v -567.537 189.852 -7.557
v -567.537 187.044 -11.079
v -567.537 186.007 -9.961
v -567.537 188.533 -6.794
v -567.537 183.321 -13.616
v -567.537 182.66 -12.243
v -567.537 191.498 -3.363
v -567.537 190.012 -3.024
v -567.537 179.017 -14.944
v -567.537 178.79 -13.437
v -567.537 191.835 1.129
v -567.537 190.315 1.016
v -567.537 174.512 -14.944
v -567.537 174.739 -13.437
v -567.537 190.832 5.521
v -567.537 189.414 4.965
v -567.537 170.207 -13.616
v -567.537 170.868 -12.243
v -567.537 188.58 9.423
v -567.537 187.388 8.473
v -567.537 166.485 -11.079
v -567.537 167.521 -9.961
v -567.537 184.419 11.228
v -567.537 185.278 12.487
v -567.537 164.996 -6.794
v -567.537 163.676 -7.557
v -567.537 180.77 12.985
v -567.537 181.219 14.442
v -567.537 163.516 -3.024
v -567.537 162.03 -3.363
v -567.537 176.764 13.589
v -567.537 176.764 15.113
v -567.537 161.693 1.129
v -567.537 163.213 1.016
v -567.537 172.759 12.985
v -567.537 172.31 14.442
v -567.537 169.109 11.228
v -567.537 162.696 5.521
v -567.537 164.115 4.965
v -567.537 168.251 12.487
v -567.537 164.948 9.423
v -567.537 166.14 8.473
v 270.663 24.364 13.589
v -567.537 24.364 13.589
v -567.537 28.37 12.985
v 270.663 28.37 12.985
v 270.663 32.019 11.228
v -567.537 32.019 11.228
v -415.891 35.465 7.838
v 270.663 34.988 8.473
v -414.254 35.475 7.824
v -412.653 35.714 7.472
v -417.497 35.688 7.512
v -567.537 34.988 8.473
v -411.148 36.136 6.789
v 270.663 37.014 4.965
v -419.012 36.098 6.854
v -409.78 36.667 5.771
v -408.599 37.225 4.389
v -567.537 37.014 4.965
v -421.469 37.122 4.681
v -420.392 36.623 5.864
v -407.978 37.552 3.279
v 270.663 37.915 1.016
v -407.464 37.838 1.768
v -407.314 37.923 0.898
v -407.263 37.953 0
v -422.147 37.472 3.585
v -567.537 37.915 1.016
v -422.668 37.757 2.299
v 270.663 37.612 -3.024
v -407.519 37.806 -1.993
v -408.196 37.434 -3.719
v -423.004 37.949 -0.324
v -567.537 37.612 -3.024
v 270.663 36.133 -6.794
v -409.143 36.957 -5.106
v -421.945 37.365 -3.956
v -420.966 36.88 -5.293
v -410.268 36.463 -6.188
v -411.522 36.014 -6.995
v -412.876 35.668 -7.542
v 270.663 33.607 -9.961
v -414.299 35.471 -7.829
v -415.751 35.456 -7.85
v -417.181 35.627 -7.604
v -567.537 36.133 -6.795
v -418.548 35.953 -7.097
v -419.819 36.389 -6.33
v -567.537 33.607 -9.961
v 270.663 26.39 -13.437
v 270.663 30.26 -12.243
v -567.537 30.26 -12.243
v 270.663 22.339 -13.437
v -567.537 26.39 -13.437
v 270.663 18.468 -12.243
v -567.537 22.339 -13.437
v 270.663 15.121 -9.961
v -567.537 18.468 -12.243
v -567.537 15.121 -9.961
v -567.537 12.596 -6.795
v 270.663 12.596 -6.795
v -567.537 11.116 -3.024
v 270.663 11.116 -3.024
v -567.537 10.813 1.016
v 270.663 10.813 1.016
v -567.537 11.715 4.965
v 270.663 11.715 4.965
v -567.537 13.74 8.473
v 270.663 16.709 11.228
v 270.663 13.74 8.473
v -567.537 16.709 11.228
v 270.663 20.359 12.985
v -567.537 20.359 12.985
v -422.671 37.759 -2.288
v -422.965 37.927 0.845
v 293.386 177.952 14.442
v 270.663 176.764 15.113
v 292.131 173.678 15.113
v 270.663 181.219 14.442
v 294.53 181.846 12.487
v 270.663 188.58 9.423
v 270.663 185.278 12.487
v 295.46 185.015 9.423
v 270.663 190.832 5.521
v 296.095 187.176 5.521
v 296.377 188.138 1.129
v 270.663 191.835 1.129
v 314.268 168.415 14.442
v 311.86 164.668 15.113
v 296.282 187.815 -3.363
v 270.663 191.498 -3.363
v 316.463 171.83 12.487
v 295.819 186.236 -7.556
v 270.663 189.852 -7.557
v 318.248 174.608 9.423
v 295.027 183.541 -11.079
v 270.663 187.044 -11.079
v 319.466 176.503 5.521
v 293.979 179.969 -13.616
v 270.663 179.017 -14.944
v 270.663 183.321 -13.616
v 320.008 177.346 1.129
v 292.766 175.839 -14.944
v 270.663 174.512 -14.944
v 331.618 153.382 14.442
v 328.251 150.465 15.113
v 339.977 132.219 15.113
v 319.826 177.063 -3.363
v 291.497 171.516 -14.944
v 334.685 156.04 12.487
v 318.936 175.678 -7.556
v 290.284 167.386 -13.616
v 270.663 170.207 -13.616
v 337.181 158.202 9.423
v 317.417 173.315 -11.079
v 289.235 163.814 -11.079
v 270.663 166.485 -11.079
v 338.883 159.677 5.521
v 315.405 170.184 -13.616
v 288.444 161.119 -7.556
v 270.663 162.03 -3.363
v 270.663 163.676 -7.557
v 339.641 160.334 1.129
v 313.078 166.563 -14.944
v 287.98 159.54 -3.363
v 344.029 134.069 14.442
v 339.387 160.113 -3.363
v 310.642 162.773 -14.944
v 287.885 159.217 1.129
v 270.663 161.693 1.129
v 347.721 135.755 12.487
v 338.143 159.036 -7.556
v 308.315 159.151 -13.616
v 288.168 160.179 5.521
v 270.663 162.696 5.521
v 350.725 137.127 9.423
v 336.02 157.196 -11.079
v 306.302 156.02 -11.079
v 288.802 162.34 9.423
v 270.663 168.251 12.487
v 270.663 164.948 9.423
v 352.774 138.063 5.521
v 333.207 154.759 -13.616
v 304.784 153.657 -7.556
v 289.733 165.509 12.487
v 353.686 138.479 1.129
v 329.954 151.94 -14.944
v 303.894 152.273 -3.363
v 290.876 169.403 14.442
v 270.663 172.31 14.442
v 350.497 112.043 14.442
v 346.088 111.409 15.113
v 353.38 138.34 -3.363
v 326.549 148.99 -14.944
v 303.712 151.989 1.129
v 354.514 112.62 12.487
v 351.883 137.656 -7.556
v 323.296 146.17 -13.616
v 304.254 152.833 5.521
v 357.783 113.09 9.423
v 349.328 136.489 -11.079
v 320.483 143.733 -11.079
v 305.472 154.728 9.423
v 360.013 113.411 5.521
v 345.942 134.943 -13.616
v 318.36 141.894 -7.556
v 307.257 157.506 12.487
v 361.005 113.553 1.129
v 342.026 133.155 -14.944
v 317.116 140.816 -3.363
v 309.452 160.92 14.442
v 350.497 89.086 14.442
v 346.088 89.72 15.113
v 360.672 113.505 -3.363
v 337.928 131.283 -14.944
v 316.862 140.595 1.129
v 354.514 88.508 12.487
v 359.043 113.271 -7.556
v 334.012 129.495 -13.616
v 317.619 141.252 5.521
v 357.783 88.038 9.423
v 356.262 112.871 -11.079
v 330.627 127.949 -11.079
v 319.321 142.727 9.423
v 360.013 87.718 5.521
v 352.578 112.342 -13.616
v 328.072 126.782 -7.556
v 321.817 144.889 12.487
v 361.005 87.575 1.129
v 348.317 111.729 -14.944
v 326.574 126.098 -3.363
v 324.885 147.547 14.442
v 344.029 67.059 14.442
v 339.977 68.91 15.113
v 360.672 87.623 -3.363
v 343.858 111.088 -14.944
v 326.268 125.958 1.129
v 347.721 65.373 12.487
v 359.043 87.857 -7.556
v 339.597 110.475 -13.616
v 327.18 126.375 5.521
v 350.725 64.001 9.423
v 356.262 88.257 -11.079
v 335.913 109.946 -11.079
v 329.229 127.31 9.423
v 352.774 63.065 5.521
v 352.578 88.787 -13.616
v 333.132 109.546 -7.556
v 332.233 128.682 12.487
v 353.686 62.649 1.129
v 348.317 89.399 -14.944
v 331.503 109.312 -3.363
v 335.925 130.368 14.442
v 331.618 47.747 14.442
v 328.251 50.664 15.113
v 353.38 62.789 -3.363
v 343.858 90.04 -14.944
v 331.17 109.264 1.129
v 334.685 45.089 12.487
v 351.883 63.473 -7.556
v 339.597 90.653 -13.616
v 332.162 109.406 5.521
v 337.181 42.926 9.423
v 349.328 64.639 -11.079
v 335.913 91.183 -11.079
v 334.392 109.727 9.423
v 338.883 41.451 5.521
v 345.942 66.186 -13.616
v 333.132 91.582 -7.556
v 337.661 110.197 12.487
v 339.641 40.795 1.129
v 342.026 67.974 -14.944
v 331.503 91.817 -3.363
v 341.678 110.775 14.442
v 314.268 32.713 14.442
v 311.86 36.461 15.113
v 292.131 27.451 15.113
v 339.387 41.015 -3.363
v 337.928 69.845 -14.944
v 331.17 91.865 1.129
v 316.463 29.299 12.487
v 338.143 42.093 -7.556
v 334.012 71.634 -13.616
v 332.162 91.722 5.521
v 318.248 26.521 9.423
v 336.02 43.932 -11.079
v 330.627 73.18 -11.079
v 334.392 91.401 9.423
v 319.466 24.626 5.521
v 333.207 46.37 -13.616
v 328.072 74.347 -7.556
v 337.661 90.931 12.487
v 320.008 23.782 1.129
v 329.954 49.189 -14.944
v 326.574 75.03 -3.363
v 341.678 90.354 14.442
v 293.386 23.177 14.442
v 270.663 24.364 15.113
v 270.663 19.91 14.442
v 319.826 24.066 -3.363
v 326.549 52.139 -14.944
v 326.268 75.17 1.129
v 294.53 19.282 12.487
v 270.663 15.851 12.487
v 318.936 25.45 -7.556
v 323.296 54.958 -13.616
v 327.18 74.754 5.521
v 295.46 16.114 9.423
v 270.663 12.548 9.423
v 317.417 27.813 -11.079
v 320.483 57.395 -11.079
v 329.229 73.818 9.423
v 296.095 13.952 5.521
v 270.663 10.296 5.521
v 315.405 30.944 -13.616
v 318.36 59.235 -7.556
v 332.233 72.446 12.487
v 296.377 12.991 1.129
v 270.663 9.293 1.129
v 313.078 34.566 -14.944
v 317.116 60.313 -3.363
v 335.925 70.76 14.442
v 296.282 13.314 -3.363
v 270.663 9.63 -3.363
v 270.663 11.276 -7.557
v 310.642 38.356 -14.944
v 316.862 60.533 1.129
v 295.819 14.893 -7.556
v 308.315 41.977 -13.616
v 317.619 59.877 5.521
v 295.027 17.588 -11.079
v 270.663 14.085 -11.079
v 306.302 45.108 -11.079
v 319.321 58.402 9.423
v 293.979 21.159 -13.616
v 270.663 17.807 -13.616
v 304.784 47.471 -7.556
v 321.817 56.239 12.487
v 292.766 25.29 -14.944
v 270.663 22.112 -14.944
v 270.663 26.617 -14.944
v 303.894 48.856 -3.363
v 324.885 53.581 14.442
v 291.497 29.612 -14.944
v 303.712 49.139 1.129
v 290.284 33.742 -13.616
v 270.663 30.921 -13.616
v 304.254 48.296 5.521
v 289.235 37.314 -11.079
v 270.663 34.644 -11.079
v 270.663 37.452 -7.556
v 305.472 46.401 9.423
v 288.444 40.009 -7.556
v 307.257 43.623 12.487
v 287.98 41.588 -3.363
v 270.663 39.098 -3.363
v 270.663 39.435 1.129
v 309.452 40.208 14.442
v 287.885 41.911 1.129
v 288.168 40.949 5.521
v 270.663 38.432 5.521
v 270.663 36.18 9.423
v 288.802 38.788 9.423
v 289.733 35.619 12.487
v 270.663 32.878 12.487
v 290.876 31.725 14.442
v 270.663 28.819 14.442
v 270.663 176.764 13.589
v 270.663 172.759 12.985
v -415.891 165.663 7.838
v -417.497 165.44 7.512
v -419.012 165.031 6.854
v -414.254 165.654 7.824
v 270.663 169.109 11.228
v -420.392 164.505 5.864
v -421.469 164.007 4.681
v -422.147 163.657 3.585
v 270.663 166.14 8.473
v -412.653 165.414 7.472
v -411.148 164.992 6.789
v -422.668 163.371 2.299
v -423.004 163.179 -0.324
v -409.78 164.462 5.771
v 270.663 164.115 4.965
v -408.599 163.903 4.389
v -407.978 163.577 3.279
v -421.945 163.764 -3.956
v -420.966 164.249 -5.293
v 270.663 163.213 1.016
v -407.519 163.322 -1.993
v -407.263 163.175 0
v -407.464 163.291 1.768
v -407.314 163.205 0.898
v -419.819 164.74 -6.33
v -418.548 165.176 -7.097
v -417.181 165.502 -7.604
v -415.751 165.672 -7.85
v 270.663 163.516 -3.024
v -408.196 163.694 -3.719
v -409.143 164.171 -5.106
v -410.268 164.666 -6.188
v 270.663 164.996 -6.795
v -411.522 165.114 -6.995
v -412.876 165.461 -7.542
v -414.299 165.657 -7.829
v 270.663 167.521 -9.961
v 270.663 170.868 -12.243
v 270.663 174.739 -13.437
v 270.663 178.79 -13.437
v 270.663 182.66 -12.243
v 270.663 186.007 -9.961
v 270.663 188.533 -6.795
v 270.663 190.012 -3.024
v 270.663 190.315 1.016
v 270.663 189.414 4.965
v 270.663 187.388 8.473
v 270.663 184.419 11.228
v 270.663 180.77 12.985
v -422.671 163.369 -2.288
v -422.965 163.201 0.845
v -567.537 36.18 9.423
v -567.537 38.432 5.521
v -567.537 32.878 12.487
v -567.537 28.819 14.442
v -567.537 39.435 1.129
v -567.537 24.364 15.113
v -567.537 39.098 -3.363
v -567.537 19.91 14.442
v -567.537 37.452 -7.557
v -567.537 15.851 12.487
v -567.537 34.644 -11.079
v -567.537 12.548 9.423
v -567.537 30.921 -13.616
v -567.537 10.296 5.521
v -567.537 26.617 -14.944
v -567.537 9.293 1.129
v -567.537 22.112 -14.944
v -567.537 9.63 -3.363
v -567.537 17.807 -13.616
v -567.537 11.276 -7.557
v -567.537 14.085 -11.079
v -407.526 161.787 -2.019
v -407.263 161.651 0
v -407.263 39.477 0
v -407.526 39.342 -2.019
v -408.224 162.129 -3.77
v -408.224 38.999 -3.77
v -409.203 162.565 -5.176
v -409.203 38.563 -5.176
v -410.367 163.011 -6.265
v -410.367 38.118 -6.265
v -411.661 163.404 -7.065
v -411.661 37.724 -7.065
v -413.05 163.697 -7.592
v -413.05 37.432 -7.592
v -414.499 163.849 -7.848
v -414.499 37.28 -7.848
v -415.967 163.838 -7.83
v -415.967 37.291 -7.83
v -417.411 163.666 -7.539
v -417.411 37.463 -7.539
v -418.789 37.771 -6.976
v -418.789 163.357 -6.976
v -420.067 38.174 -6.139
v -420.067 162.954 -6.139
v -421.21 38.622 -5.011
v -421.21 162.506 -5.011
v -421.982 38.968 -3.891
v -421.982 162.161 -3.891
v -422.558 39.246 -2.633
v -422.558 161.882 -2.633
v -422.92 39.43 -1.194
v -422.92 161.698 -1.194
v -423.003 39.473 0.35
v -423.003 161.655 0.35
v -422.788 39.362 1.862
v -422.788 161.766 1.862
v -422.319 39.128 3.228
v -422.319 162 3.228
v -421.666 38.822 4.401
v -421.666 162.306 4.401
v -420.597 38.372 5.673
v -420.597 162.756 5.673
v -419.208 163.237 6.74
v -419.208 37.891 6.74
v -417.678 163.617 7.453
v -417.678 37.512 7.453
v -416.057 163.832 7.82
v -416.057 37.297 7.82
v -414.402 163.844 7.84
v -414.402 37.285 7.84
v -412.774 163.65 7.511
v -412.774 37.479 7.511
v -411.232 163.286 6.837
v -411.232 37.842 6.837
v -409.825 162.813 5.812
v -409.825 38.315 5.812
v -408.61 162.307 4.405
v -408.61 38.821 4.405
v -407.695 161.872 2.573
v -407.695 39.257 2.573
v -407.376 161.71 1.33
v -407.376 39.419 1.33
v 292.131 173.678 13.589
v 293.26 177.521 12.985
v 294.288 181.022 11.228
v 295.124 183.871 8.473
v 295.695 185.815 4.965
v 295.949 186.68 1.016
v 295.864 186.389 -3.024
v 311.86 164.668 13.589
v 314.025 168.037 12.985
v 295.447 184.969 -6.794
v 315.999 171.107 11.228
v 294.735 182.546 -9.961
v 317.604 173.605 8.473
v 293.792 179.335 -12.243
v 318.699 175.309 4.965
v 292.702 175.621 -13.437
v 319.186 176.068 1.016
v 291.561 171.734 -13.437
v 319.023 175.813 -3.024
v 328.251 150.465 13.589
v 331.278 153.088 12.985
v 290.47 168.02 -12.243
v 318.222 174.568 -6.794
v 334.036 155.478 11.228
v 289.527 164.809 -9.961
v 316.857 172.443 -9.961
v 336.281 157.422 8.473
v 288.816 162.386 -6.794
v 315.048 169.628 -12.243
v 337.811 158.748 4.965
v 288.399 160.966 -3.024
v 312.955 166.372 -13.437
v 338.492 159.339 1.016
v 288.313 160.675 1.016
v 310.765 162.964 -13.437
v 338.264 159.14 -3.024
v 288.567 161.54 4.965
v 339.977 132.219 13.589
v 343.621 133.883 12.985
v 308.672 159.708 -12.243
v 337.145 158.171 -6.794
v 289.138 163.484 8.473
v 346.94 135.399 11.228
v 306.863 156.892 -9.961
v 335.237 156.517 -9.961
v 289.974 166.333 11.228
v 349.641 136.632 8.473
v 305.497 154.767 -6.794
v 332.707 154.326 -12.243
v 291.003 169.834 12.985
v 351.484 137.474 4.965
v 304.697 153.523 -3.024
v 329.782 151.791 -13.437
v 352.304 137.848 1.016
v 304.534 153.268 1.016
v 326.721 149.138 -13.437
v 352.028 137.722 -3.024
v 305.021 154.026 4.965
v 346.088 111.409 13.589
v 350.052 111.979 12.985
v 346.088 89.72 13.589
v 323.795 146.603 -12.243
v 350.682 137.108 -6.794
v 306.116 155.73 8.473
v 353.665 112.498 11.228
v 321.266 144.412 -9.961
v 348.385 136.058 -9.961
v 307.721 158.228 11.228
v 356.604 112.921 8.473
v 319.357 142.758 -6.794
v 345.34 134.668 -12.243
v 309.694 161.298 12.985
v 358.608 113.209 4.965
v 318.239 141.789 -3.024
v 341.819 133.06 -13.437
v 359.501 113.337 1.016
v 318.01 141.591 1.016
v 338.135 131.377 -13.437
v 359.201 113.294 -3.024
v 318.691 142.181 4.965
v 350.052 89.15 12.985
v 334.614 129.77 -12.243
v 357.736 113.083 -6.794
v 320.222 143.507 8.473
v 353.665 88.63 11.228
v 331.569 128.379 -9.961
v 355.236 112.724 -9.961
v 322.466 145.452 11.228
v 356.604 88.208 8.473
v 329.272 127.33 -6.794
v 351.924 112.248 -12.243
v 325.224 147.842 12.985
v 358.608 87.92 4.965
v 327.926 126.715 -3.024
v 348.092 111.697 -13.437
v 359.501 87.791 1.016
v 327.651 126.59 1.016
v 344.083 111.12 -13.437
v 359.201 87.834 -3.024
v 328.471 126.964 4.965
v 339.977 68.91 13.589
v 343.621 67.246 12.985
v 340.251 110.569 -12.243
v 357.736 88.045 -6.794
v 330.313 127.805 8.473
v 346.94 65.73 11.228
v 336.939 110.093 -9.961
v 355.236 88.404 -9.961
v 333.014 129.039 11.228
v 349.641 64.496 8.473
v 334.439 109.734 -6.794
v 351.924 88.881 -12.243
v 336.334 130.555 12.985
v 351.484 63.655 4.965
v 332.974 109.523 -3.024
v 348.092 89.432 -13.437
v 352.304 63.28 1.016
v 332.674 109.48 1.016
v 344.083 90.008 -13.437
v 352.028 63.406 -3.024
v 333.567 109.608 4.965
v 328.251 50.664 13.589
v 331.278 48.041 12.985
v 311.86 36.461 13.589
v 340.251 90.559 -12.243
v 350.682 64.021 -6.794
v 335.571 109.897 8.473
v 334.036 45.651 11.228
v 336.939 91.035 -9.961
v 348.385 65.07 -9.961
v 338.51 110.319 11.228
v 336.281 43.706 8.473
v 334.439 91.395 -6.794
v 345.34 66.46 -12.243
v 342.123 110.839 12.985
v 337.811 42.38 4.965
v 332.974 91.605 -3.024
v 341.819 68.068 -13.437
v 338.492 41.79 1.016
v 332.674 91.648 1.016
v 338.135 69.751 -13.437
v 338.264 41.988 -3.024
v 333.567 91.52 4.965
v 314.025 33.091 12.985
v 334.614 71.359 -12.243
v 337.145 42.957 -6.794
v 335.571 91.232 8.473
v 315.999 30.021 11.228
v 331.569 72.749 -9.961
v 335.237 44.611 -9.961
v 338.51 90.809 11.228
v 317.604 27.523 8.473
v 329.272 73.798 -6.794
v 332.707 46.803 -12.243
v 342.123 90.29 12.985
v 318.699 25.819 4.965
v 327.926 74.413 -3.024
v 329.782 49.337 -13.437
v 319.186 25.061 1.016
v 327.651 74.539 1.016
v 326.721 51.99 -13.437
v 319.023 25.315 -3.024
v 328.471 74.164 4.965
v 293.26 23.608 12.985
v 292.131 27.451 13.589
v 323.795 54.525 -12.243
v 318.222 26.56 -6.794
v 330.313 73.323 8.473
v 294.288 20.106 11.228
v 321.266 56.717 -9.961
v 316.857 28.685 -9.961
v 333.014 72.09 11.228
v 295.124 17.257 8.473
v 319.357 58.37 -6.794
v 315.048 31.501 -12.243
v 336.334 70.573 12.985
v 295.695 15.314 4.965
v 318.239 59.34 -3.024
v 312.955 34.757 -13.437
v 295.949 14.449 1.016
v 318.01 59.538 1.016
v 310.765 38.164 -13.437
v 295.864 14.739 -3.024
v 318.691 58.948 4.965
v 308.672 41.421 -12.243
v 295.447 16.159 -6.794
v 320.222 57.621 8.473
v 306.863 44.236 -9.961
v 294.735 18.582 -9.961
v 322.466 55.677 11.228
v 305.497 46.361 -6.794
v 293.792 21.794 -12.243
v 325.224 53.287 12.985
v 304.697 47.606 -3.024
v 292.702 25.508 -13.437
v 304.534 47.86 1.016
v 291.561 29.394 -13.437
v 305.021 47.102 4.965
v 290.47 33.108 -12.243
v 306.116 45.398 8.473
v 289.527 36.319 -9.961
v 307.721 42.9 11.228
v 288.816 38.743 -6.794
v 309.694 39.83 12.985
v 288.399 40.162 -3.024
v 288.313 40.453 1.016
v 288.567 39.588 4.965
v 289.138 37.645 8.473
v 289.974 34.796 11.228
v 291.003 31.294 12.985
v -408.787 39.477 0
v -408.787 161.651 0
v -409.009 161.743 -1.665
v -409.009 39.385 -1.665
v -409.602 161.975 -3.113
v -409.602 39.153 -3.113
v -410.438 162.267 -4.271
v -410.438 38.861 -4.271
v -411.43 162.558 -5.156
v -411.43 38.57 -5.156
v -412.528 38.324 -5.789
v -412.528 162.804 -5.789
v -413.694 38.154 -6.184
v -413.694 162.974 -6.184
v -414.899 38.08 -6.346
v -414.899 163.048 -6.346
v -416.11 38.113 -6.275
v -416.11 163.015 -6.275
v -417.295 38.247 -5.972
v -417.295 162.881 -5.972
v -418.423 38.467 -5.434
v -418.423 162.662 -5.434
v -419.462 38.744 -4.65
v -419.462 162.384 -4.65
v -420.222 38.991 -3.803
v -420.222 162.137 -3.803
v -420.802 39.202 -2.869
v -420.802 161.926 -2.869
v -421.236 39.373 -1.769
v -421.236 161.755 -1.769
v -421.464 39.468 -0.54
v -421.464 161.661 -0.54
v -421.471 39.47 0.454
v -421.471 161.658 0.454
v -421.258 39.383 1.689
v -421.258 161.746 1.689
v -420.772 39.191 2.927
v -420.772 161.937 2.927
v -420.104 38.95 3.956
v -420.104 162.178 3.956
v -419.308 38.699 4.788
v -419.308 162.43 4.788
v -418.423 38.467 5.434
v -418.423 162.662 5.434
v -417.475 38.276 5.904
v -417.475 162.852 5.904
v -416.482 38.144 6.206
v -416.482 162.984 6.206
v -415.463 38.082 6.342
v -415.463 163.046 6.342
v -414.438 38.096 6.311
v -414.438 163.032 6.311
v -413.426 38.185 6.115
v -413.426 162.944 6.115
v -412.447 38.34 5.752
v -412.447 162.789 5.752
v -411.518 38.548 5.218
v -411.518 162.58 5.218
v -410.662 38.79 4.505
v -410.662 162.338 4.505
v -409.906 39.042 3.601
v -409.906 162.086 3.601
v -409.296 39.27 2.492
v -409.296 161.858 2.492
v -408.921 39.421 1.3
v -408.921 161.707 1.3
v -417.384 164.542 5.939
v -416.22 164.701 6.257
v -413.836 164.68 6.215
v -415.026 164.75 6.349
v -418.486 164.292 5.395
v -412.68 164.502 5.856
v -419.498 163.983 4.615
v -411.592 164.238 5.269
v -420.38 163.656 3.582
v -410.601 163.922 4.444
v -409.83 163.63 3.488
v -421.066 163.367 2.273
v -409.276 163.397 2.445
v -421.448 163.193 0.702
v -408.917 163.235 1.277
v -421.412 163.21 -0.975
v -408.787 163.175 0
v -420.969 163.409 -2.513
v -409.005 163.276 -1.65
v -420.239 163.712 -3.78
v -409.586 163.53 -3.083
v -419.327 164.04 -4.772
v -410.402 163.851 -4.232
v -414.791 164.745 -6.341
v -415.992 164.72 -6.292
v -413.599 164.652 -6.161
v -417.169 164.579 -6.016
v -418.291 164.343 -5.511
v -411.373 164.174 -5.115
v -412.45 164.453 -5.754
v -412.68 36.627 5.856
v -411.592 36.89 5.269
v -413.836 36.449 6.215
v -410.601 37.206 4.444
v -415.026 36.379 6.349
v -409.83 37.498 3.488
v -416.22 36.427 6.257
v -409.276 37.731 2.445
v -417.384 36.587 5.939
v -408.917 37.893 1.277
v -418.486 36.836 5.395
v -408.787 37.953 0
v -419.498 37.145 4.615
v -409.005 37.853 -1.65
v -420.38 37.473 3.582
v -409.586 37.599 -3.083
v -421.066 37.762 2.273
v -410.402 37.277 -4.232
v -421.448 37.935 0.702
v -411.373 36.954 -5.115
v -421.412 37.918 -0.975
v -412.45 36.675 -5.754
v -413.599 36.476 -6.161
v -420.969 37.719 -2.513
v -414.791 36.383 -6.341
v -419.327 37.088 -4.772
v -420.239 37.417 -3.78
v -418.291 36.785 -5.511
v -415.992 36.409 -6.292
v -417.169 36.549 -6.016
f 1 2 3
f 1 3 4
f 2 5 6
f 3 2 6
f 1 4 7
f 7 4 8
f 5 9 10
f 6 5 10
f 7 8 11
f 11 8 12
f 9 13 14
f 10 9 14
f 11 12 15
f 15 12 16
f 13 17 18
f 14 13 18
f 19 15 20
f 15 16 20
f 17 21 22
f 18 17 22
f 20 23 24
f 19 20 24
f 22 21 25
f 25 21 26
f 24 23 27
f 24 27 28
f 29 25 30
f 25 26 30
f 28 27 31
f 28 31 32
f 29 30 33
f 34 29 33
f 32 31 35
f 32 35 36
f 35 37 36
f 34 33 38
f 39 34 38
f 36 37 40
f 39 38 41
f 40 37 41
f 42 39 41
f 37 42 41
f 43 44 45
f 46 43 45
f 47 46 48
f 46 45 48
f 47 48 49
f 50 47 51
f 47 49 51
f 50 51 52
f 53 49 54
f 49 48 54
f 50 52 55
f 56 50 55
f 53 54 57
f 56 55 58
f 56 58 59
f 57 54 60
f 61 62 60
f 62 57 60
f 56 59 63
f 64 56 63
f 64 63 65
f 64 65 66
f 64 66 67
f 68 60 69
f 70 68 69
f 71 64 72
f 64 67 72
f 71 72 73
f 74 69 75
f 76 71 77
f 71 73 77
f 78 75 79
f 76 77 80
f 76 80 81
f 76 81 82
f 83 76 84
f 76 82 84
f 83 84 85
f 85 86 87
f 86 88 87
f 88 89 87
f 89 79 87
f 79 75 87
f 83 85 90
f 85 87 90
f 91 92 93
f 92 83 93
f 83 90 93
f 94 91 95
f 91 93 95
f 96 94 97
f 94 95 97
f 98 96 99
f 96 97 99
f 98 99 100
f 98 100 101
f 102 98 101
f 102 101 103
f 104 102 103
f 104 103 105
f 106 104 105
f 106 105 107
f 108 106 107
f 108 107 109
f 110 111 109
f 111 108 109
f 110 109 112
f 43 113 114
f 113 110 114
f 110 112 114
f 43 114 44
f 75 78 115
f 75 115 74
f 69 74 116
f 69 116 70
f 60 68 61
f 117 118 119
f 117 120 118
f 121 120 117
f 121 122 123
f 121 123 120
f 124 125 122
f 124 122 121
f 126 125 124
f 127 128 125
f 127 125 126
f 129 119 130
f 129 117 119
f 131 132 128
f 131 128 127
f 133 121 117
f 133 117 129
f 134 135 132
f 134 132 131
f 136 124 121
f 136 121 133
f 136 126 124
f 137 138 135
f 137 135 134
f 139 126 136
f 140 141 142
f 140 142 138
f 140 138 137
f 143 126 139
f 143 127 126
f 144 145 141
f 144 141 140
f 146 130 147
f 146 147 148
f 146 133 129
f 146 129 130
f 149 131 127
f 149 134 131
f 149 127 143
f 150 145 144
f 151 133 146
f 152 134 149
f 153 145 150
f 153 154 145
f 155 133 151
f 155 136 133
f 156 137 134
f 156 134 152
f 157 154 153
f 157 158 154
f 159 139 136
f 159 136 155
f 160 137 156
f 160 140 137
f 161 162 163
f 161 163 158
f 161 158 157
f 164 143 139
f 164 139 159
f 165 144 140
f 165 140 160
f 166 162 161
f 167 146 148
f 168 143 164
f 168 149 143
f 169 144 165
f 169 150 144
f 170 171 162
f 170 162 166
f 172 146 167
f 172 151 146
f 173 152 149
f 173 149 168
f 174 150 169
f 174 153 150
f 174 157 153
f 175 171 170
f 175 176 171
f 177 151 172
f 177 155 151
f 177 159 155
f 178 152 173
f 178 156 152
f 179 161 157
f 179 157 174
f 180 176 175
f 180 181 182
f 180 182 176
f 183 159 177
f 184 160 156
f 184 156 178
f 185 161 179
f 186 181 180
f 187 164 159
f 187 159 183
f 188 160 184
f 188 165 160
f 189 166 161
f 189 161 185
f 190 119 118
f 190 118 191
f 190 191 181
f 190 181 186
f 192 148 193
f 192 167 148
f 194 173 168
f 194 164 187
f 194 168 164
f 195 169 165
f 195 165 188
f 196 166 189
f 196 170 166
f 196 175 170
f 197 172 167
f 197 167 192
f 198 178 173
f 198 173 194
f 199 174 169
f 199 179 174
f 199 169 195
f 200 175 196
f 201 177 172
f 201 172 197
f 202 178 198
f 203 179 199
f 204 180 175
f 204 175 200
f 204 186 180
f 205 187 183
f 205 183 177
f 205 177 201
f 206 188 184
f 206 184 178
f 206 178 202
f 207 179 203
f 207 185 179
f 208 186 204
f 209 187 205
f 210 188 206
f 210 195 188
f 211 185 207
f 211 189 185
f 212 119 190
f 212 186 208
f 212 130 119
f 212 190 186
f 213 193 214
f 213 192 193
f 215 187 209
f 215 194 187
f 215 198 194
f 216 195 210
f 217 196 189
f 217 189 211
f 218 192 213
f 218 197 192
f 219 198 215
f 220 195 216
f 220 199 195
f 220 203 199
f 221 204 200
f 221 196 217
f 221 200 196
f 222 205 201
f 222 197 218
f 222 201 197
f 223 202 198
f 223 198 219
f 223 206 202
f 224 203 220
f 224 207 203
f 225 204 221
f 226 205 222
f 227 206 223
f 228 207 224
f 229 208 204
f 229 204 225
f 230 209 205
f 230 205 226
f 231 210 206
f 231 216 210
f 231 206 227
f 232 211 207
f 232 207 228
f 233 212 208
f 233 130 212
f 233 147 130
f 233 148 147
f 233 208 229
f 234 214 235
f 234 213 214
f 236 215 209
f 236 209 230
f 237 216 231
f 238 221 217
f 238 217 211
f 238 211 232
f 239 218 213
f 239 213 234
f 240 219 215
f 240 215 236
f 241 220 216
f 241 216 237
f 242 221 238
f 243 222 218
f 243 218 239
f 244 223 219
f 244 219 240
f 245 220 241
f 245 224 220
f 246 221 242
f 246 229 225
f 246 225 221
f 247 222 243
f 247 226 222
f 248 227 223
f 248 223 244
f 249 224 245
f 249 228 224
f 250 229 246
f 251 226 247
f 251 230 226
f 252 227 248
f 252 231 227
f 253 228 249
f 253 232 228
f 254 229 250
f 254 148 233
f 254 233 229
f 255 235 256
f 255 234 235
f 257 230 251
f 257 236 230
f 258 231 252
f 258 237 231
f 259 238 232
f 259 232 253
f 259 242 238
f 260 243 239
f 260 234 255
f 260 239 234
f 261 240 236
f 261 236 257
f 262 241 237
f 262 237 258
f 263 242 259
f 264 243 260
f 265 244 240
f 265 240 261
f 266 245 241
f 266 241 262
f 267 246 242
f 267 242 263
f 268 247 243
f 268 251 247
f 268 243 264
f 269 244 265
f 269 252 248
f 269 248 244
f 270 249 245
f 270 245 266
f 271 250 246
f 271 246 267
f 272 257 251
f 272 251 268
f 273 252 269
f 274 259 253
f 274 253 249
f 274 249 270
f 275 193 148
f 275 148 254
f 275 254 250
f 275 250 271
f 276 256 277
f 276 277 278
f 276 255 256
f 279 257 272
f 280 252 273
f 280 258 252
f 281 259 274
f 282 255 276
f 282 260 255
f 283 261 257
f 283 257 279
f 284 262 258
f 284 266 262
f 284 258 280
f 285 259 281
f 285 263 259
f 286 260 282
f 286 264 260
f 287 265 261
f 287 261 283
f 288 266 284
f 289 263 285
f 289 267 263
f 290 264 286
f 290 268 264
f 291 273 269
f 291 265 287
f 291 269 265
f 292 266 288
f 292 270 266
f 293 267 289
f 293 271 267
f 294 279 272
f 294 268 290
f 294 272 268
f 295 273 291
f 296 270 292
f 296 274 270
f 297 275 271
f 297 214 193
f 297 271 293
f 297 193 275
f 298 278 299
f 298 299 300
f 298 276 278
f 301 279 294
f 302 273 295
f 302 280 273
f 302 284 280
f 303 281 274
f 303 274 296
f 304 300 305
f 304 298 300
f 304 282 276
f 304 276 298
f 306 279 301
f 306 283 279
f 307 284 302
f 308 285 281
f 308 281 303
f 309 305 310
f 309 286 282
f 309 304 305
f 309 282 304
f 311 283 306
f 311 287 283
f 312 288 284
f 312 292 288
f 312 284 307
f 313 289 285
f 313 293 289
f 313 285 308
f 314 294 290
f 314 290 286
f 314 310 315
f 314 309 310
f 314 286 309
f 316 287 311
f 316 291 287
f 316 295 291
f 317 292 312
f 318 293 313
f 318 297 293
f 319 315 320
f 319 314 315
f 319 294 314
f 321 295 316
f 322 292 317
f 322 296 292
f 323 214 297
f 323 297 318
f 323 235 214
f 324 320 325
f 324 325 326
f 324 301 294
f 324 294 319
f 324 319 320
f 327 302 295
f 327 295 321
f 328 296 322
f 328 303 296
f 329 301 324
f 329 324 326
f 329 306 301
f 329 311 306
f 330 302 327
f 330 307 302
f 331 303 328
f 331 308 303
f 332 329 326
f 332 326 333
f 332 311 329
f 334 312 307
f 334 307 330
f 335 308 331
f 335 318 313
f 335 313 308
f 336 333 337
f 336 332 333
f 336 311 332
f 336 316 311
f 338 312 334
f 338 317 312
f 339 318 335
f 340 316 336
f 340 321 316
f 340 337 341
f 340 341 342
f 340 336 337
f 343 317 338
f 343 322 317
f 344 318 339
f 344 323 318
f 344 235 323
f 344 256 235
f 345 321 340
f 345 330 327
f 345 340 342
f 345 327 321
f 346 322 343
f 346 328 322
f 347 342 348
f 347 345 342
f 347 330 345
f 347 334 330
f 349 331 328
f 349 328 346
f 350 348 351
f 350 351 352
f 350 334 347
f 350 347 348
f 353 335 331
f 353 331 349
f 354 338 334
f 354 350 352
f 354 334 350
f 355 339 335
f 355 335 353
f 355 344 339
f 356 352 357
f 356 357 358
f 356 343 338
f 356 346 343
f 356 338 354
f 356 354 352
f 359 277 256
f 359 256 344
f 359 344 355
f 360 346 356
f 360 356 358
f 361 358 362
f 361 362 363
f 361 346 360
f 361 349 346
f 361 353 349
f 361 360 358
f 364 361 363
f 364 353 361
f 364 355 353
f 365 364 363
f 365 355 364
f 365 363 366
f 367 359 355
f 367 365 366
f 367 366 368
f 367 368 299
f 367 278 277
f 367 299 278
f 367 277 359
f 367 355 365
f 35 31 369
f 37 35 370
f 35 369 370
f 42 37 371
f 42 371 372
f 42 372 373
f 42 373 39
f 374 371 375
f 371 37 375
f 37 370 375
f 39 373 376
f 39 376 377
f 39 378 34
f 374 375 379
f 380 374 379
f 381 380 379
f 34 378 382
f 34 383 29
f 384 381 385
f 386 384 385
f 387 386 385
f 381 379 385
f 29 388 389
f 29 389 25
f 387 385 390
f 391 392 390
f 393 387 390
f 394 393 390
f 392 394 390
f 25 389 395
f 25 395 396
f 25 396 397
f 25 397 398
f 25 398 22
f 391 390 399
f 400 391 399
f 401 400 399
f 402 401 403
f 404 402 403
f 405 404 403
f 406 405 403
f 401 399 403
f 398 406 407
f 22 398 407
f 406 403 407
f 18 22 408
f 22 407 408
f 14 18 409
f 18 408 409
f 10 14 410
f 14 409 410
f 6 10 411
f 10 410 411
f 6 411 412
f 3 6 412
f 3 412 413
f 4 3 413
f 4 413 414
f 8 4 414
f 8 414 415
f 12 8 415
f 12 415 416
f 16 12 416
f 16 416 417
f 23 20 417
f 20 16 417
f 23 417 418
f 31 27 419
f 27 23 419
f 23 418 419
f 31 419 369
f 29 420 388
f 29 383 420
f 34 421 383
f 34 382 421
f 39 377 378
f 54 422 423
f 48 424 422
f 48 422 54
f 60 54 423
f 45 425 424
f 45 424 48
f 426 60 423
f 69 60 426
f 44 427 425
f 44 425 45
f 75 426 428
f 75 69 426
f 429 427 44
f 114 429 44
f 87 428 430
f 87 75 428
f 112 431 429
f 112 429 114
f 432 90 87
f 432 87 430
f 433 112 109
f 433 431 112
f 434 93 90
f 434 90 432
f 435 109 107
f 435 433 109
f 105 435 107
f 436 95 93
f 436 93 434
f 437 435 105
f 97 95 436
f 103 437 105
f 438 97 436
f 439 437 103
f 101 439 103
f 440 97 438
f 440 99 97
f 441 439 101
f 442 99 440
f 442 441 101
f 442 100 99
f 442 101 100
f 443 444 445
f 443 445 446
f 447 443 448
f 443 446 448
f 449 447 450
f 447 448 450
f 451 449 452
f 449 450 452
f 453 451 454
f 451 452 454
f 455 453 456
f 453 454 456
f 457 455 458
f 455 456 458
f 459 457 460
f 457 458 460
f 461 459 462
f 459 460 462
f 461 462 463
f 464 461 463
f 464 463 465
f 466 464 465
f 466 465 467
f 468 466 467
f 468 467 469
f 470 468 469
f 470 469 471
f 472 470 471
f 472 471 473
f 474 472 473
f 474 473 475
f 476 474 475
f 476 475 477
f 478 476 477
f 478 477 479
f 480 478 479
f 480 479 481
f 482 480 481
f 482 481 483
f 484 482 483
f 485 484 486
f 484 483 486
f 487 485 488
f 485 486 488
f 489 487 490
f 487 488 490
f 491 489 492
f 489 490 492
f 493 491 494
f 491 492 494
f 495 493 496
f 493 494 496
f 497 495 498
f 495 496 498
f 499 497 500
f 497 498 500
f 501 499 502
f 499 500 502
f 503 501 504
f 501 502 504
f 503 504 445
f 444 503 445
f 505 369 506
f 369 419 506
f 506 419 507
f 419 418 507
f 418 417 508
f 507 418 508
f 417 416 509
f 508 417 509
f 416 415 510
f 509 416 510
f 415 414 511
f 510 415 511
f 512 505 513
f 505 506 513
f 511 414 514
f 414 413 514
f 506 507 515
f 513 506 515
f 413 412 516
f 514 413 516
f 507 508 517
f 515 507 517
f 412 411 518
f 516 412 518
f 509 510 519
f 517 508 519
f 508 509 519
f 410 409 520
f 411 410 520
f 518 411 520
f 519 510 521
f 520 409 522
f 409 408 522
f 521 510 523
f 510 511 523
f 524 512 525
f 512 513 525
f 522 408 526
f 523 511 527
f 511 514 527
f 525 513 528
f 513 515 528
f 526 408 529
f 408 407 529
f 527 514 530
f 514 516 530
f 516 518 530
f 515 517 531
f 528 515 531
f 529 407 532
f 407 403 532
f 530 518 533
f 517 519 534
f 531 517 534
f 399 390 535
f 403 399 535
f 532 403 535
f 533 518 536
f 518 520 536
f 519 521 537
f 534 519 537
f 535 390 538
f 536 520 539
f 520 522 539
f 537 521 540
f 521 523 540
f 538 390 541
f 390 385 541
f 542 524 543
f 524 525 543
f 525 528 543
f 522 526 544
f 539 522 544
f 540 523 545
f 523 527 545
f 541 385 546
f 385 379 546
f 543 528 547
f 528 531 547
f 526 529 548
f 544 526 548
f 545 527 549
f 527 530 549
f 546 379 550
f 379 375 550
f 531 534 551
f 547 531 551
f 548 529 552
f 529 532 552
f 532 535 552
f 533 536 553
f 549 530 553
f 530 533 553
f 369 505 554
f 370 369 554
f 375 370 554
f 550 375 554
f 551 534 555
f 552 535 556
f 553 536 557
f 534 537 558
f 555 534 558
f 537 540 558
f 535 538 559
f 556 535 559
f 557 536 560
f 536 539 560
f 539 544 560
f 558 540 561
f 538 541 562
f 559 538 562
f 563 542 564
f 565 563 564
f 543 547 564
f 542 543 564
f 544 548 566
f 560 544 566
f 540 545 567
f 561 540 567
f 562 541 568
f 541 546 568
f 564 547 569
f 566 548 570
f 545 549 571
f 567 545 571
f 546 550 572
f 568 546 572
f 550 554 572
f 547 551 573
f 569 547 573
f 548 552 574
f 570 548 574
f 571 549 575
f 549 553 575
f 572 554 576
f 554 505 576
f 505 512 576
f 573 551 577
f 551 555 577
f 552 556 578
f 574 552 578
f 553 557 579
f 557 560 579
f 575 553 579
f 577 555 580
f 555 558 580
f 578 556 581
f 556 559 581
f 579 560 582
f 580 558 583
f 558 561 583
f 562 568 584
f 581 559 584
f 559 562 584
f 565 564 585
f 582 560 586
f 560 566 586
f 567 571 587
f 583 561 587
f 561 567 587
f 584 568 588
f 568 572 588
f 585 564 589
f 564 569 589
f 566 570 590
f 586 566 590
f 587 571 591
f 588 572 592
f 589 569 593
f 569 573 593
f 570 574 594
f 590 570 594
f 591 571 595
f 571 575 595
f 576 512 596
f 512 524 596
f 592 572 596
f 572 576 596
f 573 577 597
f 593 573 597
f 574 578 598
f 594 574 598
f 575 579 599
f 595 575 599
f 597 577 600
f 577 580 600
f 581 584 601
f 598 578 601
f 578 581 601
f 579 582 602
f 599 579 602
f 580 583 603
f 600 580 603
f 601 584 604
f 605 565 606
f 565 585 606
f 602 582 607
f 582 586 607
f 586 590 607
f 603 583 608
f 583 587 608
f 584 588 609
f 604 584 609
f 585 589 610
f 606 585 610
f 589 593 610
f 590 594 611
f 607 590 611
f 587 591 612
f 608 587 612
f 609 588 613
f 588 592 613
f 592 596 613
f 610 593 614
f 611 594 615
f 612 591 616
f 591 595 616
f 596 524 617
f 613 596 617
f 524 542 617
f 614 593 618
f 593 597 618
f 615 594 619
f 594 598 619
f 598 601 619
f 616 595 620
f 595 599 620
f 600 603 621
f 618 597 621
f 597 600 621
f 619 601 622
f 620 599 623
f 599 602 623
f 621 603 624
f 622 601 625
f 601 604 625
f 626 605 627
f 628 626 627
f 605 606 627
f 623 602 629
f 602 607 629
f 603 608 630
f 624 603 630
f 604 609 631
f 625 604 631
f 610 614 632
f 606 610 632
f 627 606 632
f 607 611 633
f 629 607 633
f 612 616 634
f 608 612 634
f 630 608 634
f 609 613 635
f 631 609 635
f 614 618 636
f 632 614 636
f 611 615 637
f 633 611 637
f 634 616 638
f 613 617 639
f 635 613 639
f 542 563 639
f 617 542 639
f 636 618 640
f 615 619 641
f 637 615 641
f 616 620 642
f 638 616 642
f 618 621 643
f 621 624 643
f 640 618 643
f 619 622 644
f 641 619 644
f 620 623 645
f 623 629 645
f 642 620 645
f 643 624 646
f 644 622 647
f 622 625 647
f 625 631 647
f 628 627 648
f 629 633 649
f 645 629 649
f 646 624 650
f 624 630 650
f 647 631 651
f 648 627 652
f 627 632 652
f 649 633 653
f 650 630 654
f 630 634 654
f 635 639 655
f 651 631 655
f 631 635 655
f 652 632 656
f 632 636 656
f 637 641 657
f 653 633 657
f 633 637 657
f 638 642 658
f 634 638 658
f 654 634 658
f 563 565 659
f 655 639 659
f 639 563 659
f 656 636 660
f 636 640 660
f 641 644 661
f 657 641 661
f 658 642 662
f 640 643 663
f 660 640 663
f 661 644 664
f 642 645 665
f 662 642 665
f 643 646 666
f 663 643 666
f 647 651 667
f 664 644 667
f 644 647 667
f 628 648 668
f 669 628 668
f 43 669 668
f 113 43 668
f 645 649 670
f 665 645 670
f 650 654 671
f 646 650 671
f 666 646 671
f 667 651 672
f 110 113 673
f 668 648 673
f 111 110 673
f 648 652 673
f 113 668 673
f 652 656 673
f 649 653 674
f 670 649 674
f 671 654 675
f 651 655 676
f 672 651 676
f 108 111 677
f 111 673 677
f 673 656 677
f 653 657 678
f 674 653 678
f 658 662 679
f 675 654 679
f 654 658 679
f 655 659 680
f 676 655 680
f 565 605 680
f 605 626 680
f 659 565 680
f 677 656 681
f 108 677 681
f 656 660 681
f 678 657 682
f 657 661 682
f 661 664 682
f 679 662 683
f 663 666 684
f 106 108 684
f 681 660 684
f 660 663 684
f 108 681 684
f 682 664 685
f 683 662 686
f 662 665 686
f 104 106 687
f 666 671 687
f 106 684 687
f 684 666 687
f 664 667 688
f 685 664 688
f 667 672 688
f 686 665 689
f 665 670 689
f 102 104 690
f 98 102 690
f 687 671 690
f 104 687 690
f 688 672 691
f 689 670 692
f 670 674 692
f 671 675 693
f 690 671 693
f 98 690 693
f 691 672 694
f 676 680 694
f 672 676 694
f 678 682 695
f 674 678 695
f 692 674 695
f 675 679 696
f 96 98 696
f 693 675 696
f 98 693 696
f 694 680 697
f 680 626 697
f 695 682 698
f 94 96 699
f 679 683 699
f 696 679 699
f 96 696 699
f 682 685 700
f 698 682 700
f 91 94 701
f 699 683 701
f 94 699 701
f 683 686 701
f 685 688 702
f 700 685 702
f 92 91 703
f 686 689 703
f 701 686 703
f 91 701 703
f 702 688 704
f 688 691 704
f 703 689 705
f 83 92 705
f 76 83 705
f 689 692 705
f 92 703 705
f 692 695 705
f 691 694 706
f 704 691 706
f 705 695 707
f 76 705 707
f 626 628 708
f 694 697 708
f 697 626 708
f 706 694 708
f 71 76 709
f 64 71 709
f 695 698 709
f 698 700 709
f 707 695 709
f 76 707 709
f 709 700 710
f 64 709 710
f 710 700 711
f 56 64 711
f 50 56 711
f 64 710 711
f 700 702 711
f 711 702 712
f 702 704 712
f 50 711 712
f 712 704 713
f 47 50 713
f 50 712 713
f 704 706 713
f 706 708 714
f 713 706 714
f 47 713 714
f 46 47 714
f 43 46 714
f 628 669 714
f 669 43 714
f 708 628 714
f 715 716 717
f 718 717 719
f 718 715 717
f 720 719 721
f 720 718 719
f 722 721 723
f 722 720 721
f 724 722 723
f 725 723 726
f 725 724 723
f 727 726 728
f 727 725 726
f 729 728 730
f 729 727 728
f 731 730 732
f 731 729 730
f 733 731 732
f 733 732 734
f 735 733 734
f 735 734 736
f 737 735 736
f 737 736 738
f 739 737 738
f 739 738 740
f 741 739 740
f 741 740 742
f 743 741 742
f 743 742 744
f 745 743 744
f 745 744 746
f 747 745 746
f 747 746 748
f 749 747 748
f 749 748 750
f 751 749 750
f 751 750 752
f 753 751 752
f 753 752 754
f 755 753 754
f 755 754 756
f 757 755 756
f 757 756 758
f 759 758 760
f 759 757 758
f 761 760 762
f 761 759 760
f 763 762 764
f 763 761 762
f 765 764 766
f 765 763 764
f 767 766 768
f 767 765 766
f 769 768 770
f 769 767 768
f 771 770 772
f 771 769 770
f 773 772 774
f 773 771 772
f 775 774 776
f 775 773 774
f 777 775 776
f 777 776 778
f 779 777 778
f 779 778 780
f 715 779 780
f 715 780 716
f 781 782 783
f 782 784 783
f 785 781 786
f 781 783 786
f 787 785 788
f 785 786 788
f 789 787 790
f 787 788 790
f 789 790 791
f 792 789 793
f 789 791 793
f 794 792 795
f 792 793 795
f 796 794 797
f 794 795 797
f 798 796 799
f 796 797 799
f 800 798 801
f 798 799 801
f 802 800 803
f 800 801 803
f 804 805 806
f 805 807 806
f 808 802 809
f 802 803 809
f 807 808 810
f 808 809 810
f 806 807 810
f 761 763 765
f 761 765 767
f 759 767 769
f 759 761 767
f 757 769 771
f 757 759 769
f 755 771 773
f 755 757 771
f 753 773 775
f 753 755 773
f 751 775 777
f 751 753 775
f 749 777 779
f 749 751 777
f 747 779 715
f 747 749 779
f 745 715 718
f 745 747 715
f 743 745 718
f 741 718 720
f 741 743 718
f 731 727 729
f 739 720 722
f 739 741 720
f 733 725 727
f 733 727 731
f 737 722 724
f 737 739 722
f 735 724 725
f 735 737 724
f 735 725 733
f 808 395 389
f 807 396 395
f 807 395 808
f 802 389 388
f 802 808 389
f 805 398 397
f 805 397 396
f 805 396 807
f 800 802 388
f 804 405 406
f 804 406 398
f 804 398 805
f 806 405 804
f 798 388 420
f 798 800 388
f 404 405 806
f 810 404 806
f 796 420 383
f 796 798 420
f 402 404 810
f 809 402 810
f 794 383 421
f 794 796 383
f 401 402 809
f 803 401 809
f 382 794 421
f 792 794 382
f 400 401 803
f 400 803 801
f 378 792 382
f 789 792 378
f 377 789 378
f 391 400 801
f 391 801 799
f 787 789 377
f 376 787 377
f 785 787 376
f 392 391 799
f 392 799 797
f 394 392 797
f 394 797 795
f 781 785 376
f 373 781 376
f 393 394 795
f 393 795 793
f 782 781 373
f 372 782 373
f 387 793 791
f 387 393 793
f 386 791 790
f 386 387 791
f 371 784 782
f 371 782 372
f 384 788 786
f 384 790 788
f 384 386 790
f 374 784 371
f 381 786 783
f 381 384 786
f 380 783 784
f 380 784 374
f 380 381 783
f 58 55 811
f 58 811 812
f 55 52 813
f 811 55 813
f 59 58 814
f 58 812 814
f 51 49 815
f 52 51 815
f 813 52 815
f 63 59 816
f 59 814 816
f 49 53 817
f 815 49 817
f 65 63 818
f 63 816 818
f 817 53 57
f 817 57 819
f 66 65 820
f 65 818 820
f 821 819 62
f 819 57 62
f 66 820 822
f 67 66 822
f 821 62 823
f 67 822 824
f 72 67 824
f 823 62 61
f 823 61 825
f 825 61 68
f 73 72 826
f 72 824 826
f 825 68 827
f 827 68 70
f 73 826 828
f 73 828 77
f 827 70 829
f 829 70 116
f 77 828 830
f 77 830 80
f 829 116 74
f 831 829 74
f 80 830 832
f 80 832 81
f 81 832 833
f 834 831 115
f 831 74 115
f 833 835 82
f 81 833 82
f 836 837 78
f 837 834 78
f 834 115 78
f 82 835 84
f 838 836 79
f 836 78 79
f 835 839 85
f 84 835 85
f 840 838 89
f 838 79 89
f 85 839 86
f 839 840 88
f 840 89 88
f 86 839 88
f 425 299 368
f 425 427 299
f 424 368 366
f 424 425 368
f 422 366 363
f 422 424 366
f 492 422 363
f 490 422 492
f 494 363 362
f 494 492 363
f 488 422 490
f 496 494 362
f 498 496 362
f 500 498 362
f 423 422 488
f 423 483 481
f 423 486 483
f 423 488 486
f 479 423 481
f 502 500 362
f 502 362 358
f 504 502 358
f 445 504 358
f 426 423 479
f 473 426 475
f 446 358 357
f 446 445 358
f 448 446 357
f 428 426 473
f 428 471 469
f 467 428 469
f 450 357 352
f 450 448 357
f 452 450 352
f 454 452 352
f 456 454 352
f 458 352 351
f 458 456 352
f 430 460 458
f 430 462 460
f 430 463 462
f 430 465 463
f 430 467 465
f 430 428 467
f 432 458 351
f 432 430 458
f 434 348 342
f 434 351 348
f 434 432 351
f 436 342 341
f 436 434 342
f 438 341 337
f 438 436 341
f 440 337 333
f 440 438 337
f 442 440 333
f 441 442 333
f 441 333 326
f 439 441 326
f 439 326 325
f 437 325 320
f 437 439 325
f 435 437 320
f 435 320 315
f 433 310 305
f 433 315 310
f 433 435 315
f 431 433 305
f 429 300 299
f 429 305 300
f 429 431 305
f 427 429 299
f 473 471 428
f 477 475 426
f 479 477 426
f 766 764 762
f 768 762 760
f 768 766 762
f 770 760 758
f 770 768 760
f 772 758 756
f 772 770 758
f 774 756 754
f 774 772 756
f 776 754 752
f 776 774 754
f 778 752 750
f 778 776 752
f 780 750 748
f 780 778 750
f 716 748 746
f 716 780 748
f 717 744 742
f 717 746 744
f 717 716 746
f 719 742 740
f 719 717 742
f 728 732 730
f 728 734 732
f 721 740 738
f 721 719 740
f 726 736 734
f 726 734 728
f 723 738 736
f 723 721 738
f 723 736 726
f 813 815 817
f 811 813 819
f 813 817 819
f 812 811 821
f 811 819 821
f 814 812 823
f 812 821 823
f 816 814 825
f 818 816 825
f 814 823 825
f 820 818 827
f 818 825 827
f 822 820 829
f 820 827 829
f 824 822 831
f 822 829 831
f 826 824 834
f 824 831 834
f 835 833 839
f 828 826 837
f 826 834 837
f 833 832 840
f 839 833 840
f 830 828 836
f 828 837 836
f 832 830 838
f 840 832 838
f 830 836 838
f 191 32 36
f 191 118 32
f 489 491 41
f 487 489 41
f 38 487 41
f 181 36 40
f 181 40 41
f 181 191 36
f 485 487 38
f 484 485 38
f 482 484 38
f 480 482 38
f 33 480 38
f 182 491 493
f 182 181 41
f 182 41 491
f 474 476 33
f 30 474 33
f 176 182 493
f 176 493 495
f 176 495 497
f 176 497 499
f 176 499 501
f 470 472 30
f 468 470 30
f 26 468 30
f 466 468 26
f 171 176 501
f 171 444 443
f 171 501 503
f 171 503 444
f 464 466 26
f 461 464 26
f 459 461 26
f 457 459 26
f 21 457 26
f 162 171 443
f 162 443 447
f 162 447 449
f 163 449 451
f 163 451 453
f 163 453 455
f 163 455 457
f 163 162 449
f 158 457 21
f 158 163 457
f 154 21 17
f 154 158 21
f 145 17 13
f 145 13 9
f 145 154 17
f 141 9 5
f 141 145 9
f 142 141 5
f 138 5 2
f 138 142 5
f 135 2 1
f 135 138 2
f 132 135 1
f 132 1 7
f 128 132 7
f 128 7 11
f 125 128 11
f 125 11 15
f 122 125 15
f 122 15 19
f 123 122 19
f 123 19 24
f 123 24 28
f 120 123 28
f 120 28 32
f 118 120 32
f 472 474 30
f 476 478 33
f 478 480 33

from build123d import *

# Parameters (mm, degrees)
SWEEP_THIN1_PROFILE_R   = 15.113
SWEEP_THIN1_PROFILE_R_2 = 13.589
SWEEP_THIN3_START       = 24.364184397
SWEEP_THIN3_OUTLINE_R   = 7.874
SWEEP_THIN3_OUTLINE_R_2 = 6.35
SWEEP_THIN3_DEPTH       = 152.4
CUT_EXTRUDE1_START      = -279.4
SKETCH47_R              = 13.589
CUT_EXTRUDE1_DEPTH      = 279.4
SKETCH48_R              = 13.589
CUT_EXTRUDE2_DEPTH      = 279.4


# Read off the part's stored shape, not the designer's step: Sweep-Thin3
with BuildPart() as part:
    # Sweep-Thin1: sweep along a path in Sketch1
    with BuildLine(Plane.XY) as sweep_thin1_path:
        Line((-567.536879433, 176.764184397), (270.663120567, 176.764184397))
        ThreePointArc((270.663120567, 176.764184397), (346.863120567, 100.564184397), (270.663120567, 24.364184397))
        Line((270.663120567, 24.364184397), (-567.536879433, 24.364184397))
    # Sweep-Thin1 profile (on start of the path) → Sweep-Thin1 (sweep)
    with BuildSketch(Plane(origin=(-567.536879433, 176.764184397, 0), x_dir=(0, 0, 1), z_dir=(1, 0, 0))):
        Circle(SWEEP_THIN1_PROFILE_R)
        Circle(SWEEP_THIN1_PROFILE_R_2, mode=Mode.SUBTRACT)
    sweep(path=sweep_thin1_path.line)

    # Sweep-Thin3 outline → Sweep-Thin3 (add)
    with BuildSketch(Plane(origin=(0, 0, 0), x_dir=(1, 0, 0), z_dir=(0, 1, 0)).offset(SWEEP_THIN3_START)):
        with Locations((-415.136879433, 0)):
            Circle(SWEEP_THIN3_OUTLINE_R)
        with Locations((-415.136879433, 0)):
            Circle(SWEEP_THIN3_OUTLINE_R_2, mode=Mode.SUBTRACT)
    extrude(amount=SWEEP_THIN3_DEPTH)

    # Sketch47 → Cut-Extrude1 (cut)
    with BuildSketch(Plane.ZY.offset(567.536879433).offset(CUT_EXTRUDE1_START)):
        with Locations(Location((0, 176.764184397, 0), (0, 0, 90))):
            Circle(SKETCH47_R)
    extrude(amount=CUT_EXTRUDE1_DEPTH, mode=Mode.SUBTRACT)

    # Sketch48 → Cut-Extrude2 (cut)
    with BuildSketch(Plane.ZY.offset(567.536879433)):
        with Locations(Location((0, 24.364184397, 0), (0, 0, 270))):
            Circle(SKETCH48_R)
    extrude(amount=-CUT_EXTRUDE2_DEPTH, mode=Mode.SUBTRACT)


solid = part.part
